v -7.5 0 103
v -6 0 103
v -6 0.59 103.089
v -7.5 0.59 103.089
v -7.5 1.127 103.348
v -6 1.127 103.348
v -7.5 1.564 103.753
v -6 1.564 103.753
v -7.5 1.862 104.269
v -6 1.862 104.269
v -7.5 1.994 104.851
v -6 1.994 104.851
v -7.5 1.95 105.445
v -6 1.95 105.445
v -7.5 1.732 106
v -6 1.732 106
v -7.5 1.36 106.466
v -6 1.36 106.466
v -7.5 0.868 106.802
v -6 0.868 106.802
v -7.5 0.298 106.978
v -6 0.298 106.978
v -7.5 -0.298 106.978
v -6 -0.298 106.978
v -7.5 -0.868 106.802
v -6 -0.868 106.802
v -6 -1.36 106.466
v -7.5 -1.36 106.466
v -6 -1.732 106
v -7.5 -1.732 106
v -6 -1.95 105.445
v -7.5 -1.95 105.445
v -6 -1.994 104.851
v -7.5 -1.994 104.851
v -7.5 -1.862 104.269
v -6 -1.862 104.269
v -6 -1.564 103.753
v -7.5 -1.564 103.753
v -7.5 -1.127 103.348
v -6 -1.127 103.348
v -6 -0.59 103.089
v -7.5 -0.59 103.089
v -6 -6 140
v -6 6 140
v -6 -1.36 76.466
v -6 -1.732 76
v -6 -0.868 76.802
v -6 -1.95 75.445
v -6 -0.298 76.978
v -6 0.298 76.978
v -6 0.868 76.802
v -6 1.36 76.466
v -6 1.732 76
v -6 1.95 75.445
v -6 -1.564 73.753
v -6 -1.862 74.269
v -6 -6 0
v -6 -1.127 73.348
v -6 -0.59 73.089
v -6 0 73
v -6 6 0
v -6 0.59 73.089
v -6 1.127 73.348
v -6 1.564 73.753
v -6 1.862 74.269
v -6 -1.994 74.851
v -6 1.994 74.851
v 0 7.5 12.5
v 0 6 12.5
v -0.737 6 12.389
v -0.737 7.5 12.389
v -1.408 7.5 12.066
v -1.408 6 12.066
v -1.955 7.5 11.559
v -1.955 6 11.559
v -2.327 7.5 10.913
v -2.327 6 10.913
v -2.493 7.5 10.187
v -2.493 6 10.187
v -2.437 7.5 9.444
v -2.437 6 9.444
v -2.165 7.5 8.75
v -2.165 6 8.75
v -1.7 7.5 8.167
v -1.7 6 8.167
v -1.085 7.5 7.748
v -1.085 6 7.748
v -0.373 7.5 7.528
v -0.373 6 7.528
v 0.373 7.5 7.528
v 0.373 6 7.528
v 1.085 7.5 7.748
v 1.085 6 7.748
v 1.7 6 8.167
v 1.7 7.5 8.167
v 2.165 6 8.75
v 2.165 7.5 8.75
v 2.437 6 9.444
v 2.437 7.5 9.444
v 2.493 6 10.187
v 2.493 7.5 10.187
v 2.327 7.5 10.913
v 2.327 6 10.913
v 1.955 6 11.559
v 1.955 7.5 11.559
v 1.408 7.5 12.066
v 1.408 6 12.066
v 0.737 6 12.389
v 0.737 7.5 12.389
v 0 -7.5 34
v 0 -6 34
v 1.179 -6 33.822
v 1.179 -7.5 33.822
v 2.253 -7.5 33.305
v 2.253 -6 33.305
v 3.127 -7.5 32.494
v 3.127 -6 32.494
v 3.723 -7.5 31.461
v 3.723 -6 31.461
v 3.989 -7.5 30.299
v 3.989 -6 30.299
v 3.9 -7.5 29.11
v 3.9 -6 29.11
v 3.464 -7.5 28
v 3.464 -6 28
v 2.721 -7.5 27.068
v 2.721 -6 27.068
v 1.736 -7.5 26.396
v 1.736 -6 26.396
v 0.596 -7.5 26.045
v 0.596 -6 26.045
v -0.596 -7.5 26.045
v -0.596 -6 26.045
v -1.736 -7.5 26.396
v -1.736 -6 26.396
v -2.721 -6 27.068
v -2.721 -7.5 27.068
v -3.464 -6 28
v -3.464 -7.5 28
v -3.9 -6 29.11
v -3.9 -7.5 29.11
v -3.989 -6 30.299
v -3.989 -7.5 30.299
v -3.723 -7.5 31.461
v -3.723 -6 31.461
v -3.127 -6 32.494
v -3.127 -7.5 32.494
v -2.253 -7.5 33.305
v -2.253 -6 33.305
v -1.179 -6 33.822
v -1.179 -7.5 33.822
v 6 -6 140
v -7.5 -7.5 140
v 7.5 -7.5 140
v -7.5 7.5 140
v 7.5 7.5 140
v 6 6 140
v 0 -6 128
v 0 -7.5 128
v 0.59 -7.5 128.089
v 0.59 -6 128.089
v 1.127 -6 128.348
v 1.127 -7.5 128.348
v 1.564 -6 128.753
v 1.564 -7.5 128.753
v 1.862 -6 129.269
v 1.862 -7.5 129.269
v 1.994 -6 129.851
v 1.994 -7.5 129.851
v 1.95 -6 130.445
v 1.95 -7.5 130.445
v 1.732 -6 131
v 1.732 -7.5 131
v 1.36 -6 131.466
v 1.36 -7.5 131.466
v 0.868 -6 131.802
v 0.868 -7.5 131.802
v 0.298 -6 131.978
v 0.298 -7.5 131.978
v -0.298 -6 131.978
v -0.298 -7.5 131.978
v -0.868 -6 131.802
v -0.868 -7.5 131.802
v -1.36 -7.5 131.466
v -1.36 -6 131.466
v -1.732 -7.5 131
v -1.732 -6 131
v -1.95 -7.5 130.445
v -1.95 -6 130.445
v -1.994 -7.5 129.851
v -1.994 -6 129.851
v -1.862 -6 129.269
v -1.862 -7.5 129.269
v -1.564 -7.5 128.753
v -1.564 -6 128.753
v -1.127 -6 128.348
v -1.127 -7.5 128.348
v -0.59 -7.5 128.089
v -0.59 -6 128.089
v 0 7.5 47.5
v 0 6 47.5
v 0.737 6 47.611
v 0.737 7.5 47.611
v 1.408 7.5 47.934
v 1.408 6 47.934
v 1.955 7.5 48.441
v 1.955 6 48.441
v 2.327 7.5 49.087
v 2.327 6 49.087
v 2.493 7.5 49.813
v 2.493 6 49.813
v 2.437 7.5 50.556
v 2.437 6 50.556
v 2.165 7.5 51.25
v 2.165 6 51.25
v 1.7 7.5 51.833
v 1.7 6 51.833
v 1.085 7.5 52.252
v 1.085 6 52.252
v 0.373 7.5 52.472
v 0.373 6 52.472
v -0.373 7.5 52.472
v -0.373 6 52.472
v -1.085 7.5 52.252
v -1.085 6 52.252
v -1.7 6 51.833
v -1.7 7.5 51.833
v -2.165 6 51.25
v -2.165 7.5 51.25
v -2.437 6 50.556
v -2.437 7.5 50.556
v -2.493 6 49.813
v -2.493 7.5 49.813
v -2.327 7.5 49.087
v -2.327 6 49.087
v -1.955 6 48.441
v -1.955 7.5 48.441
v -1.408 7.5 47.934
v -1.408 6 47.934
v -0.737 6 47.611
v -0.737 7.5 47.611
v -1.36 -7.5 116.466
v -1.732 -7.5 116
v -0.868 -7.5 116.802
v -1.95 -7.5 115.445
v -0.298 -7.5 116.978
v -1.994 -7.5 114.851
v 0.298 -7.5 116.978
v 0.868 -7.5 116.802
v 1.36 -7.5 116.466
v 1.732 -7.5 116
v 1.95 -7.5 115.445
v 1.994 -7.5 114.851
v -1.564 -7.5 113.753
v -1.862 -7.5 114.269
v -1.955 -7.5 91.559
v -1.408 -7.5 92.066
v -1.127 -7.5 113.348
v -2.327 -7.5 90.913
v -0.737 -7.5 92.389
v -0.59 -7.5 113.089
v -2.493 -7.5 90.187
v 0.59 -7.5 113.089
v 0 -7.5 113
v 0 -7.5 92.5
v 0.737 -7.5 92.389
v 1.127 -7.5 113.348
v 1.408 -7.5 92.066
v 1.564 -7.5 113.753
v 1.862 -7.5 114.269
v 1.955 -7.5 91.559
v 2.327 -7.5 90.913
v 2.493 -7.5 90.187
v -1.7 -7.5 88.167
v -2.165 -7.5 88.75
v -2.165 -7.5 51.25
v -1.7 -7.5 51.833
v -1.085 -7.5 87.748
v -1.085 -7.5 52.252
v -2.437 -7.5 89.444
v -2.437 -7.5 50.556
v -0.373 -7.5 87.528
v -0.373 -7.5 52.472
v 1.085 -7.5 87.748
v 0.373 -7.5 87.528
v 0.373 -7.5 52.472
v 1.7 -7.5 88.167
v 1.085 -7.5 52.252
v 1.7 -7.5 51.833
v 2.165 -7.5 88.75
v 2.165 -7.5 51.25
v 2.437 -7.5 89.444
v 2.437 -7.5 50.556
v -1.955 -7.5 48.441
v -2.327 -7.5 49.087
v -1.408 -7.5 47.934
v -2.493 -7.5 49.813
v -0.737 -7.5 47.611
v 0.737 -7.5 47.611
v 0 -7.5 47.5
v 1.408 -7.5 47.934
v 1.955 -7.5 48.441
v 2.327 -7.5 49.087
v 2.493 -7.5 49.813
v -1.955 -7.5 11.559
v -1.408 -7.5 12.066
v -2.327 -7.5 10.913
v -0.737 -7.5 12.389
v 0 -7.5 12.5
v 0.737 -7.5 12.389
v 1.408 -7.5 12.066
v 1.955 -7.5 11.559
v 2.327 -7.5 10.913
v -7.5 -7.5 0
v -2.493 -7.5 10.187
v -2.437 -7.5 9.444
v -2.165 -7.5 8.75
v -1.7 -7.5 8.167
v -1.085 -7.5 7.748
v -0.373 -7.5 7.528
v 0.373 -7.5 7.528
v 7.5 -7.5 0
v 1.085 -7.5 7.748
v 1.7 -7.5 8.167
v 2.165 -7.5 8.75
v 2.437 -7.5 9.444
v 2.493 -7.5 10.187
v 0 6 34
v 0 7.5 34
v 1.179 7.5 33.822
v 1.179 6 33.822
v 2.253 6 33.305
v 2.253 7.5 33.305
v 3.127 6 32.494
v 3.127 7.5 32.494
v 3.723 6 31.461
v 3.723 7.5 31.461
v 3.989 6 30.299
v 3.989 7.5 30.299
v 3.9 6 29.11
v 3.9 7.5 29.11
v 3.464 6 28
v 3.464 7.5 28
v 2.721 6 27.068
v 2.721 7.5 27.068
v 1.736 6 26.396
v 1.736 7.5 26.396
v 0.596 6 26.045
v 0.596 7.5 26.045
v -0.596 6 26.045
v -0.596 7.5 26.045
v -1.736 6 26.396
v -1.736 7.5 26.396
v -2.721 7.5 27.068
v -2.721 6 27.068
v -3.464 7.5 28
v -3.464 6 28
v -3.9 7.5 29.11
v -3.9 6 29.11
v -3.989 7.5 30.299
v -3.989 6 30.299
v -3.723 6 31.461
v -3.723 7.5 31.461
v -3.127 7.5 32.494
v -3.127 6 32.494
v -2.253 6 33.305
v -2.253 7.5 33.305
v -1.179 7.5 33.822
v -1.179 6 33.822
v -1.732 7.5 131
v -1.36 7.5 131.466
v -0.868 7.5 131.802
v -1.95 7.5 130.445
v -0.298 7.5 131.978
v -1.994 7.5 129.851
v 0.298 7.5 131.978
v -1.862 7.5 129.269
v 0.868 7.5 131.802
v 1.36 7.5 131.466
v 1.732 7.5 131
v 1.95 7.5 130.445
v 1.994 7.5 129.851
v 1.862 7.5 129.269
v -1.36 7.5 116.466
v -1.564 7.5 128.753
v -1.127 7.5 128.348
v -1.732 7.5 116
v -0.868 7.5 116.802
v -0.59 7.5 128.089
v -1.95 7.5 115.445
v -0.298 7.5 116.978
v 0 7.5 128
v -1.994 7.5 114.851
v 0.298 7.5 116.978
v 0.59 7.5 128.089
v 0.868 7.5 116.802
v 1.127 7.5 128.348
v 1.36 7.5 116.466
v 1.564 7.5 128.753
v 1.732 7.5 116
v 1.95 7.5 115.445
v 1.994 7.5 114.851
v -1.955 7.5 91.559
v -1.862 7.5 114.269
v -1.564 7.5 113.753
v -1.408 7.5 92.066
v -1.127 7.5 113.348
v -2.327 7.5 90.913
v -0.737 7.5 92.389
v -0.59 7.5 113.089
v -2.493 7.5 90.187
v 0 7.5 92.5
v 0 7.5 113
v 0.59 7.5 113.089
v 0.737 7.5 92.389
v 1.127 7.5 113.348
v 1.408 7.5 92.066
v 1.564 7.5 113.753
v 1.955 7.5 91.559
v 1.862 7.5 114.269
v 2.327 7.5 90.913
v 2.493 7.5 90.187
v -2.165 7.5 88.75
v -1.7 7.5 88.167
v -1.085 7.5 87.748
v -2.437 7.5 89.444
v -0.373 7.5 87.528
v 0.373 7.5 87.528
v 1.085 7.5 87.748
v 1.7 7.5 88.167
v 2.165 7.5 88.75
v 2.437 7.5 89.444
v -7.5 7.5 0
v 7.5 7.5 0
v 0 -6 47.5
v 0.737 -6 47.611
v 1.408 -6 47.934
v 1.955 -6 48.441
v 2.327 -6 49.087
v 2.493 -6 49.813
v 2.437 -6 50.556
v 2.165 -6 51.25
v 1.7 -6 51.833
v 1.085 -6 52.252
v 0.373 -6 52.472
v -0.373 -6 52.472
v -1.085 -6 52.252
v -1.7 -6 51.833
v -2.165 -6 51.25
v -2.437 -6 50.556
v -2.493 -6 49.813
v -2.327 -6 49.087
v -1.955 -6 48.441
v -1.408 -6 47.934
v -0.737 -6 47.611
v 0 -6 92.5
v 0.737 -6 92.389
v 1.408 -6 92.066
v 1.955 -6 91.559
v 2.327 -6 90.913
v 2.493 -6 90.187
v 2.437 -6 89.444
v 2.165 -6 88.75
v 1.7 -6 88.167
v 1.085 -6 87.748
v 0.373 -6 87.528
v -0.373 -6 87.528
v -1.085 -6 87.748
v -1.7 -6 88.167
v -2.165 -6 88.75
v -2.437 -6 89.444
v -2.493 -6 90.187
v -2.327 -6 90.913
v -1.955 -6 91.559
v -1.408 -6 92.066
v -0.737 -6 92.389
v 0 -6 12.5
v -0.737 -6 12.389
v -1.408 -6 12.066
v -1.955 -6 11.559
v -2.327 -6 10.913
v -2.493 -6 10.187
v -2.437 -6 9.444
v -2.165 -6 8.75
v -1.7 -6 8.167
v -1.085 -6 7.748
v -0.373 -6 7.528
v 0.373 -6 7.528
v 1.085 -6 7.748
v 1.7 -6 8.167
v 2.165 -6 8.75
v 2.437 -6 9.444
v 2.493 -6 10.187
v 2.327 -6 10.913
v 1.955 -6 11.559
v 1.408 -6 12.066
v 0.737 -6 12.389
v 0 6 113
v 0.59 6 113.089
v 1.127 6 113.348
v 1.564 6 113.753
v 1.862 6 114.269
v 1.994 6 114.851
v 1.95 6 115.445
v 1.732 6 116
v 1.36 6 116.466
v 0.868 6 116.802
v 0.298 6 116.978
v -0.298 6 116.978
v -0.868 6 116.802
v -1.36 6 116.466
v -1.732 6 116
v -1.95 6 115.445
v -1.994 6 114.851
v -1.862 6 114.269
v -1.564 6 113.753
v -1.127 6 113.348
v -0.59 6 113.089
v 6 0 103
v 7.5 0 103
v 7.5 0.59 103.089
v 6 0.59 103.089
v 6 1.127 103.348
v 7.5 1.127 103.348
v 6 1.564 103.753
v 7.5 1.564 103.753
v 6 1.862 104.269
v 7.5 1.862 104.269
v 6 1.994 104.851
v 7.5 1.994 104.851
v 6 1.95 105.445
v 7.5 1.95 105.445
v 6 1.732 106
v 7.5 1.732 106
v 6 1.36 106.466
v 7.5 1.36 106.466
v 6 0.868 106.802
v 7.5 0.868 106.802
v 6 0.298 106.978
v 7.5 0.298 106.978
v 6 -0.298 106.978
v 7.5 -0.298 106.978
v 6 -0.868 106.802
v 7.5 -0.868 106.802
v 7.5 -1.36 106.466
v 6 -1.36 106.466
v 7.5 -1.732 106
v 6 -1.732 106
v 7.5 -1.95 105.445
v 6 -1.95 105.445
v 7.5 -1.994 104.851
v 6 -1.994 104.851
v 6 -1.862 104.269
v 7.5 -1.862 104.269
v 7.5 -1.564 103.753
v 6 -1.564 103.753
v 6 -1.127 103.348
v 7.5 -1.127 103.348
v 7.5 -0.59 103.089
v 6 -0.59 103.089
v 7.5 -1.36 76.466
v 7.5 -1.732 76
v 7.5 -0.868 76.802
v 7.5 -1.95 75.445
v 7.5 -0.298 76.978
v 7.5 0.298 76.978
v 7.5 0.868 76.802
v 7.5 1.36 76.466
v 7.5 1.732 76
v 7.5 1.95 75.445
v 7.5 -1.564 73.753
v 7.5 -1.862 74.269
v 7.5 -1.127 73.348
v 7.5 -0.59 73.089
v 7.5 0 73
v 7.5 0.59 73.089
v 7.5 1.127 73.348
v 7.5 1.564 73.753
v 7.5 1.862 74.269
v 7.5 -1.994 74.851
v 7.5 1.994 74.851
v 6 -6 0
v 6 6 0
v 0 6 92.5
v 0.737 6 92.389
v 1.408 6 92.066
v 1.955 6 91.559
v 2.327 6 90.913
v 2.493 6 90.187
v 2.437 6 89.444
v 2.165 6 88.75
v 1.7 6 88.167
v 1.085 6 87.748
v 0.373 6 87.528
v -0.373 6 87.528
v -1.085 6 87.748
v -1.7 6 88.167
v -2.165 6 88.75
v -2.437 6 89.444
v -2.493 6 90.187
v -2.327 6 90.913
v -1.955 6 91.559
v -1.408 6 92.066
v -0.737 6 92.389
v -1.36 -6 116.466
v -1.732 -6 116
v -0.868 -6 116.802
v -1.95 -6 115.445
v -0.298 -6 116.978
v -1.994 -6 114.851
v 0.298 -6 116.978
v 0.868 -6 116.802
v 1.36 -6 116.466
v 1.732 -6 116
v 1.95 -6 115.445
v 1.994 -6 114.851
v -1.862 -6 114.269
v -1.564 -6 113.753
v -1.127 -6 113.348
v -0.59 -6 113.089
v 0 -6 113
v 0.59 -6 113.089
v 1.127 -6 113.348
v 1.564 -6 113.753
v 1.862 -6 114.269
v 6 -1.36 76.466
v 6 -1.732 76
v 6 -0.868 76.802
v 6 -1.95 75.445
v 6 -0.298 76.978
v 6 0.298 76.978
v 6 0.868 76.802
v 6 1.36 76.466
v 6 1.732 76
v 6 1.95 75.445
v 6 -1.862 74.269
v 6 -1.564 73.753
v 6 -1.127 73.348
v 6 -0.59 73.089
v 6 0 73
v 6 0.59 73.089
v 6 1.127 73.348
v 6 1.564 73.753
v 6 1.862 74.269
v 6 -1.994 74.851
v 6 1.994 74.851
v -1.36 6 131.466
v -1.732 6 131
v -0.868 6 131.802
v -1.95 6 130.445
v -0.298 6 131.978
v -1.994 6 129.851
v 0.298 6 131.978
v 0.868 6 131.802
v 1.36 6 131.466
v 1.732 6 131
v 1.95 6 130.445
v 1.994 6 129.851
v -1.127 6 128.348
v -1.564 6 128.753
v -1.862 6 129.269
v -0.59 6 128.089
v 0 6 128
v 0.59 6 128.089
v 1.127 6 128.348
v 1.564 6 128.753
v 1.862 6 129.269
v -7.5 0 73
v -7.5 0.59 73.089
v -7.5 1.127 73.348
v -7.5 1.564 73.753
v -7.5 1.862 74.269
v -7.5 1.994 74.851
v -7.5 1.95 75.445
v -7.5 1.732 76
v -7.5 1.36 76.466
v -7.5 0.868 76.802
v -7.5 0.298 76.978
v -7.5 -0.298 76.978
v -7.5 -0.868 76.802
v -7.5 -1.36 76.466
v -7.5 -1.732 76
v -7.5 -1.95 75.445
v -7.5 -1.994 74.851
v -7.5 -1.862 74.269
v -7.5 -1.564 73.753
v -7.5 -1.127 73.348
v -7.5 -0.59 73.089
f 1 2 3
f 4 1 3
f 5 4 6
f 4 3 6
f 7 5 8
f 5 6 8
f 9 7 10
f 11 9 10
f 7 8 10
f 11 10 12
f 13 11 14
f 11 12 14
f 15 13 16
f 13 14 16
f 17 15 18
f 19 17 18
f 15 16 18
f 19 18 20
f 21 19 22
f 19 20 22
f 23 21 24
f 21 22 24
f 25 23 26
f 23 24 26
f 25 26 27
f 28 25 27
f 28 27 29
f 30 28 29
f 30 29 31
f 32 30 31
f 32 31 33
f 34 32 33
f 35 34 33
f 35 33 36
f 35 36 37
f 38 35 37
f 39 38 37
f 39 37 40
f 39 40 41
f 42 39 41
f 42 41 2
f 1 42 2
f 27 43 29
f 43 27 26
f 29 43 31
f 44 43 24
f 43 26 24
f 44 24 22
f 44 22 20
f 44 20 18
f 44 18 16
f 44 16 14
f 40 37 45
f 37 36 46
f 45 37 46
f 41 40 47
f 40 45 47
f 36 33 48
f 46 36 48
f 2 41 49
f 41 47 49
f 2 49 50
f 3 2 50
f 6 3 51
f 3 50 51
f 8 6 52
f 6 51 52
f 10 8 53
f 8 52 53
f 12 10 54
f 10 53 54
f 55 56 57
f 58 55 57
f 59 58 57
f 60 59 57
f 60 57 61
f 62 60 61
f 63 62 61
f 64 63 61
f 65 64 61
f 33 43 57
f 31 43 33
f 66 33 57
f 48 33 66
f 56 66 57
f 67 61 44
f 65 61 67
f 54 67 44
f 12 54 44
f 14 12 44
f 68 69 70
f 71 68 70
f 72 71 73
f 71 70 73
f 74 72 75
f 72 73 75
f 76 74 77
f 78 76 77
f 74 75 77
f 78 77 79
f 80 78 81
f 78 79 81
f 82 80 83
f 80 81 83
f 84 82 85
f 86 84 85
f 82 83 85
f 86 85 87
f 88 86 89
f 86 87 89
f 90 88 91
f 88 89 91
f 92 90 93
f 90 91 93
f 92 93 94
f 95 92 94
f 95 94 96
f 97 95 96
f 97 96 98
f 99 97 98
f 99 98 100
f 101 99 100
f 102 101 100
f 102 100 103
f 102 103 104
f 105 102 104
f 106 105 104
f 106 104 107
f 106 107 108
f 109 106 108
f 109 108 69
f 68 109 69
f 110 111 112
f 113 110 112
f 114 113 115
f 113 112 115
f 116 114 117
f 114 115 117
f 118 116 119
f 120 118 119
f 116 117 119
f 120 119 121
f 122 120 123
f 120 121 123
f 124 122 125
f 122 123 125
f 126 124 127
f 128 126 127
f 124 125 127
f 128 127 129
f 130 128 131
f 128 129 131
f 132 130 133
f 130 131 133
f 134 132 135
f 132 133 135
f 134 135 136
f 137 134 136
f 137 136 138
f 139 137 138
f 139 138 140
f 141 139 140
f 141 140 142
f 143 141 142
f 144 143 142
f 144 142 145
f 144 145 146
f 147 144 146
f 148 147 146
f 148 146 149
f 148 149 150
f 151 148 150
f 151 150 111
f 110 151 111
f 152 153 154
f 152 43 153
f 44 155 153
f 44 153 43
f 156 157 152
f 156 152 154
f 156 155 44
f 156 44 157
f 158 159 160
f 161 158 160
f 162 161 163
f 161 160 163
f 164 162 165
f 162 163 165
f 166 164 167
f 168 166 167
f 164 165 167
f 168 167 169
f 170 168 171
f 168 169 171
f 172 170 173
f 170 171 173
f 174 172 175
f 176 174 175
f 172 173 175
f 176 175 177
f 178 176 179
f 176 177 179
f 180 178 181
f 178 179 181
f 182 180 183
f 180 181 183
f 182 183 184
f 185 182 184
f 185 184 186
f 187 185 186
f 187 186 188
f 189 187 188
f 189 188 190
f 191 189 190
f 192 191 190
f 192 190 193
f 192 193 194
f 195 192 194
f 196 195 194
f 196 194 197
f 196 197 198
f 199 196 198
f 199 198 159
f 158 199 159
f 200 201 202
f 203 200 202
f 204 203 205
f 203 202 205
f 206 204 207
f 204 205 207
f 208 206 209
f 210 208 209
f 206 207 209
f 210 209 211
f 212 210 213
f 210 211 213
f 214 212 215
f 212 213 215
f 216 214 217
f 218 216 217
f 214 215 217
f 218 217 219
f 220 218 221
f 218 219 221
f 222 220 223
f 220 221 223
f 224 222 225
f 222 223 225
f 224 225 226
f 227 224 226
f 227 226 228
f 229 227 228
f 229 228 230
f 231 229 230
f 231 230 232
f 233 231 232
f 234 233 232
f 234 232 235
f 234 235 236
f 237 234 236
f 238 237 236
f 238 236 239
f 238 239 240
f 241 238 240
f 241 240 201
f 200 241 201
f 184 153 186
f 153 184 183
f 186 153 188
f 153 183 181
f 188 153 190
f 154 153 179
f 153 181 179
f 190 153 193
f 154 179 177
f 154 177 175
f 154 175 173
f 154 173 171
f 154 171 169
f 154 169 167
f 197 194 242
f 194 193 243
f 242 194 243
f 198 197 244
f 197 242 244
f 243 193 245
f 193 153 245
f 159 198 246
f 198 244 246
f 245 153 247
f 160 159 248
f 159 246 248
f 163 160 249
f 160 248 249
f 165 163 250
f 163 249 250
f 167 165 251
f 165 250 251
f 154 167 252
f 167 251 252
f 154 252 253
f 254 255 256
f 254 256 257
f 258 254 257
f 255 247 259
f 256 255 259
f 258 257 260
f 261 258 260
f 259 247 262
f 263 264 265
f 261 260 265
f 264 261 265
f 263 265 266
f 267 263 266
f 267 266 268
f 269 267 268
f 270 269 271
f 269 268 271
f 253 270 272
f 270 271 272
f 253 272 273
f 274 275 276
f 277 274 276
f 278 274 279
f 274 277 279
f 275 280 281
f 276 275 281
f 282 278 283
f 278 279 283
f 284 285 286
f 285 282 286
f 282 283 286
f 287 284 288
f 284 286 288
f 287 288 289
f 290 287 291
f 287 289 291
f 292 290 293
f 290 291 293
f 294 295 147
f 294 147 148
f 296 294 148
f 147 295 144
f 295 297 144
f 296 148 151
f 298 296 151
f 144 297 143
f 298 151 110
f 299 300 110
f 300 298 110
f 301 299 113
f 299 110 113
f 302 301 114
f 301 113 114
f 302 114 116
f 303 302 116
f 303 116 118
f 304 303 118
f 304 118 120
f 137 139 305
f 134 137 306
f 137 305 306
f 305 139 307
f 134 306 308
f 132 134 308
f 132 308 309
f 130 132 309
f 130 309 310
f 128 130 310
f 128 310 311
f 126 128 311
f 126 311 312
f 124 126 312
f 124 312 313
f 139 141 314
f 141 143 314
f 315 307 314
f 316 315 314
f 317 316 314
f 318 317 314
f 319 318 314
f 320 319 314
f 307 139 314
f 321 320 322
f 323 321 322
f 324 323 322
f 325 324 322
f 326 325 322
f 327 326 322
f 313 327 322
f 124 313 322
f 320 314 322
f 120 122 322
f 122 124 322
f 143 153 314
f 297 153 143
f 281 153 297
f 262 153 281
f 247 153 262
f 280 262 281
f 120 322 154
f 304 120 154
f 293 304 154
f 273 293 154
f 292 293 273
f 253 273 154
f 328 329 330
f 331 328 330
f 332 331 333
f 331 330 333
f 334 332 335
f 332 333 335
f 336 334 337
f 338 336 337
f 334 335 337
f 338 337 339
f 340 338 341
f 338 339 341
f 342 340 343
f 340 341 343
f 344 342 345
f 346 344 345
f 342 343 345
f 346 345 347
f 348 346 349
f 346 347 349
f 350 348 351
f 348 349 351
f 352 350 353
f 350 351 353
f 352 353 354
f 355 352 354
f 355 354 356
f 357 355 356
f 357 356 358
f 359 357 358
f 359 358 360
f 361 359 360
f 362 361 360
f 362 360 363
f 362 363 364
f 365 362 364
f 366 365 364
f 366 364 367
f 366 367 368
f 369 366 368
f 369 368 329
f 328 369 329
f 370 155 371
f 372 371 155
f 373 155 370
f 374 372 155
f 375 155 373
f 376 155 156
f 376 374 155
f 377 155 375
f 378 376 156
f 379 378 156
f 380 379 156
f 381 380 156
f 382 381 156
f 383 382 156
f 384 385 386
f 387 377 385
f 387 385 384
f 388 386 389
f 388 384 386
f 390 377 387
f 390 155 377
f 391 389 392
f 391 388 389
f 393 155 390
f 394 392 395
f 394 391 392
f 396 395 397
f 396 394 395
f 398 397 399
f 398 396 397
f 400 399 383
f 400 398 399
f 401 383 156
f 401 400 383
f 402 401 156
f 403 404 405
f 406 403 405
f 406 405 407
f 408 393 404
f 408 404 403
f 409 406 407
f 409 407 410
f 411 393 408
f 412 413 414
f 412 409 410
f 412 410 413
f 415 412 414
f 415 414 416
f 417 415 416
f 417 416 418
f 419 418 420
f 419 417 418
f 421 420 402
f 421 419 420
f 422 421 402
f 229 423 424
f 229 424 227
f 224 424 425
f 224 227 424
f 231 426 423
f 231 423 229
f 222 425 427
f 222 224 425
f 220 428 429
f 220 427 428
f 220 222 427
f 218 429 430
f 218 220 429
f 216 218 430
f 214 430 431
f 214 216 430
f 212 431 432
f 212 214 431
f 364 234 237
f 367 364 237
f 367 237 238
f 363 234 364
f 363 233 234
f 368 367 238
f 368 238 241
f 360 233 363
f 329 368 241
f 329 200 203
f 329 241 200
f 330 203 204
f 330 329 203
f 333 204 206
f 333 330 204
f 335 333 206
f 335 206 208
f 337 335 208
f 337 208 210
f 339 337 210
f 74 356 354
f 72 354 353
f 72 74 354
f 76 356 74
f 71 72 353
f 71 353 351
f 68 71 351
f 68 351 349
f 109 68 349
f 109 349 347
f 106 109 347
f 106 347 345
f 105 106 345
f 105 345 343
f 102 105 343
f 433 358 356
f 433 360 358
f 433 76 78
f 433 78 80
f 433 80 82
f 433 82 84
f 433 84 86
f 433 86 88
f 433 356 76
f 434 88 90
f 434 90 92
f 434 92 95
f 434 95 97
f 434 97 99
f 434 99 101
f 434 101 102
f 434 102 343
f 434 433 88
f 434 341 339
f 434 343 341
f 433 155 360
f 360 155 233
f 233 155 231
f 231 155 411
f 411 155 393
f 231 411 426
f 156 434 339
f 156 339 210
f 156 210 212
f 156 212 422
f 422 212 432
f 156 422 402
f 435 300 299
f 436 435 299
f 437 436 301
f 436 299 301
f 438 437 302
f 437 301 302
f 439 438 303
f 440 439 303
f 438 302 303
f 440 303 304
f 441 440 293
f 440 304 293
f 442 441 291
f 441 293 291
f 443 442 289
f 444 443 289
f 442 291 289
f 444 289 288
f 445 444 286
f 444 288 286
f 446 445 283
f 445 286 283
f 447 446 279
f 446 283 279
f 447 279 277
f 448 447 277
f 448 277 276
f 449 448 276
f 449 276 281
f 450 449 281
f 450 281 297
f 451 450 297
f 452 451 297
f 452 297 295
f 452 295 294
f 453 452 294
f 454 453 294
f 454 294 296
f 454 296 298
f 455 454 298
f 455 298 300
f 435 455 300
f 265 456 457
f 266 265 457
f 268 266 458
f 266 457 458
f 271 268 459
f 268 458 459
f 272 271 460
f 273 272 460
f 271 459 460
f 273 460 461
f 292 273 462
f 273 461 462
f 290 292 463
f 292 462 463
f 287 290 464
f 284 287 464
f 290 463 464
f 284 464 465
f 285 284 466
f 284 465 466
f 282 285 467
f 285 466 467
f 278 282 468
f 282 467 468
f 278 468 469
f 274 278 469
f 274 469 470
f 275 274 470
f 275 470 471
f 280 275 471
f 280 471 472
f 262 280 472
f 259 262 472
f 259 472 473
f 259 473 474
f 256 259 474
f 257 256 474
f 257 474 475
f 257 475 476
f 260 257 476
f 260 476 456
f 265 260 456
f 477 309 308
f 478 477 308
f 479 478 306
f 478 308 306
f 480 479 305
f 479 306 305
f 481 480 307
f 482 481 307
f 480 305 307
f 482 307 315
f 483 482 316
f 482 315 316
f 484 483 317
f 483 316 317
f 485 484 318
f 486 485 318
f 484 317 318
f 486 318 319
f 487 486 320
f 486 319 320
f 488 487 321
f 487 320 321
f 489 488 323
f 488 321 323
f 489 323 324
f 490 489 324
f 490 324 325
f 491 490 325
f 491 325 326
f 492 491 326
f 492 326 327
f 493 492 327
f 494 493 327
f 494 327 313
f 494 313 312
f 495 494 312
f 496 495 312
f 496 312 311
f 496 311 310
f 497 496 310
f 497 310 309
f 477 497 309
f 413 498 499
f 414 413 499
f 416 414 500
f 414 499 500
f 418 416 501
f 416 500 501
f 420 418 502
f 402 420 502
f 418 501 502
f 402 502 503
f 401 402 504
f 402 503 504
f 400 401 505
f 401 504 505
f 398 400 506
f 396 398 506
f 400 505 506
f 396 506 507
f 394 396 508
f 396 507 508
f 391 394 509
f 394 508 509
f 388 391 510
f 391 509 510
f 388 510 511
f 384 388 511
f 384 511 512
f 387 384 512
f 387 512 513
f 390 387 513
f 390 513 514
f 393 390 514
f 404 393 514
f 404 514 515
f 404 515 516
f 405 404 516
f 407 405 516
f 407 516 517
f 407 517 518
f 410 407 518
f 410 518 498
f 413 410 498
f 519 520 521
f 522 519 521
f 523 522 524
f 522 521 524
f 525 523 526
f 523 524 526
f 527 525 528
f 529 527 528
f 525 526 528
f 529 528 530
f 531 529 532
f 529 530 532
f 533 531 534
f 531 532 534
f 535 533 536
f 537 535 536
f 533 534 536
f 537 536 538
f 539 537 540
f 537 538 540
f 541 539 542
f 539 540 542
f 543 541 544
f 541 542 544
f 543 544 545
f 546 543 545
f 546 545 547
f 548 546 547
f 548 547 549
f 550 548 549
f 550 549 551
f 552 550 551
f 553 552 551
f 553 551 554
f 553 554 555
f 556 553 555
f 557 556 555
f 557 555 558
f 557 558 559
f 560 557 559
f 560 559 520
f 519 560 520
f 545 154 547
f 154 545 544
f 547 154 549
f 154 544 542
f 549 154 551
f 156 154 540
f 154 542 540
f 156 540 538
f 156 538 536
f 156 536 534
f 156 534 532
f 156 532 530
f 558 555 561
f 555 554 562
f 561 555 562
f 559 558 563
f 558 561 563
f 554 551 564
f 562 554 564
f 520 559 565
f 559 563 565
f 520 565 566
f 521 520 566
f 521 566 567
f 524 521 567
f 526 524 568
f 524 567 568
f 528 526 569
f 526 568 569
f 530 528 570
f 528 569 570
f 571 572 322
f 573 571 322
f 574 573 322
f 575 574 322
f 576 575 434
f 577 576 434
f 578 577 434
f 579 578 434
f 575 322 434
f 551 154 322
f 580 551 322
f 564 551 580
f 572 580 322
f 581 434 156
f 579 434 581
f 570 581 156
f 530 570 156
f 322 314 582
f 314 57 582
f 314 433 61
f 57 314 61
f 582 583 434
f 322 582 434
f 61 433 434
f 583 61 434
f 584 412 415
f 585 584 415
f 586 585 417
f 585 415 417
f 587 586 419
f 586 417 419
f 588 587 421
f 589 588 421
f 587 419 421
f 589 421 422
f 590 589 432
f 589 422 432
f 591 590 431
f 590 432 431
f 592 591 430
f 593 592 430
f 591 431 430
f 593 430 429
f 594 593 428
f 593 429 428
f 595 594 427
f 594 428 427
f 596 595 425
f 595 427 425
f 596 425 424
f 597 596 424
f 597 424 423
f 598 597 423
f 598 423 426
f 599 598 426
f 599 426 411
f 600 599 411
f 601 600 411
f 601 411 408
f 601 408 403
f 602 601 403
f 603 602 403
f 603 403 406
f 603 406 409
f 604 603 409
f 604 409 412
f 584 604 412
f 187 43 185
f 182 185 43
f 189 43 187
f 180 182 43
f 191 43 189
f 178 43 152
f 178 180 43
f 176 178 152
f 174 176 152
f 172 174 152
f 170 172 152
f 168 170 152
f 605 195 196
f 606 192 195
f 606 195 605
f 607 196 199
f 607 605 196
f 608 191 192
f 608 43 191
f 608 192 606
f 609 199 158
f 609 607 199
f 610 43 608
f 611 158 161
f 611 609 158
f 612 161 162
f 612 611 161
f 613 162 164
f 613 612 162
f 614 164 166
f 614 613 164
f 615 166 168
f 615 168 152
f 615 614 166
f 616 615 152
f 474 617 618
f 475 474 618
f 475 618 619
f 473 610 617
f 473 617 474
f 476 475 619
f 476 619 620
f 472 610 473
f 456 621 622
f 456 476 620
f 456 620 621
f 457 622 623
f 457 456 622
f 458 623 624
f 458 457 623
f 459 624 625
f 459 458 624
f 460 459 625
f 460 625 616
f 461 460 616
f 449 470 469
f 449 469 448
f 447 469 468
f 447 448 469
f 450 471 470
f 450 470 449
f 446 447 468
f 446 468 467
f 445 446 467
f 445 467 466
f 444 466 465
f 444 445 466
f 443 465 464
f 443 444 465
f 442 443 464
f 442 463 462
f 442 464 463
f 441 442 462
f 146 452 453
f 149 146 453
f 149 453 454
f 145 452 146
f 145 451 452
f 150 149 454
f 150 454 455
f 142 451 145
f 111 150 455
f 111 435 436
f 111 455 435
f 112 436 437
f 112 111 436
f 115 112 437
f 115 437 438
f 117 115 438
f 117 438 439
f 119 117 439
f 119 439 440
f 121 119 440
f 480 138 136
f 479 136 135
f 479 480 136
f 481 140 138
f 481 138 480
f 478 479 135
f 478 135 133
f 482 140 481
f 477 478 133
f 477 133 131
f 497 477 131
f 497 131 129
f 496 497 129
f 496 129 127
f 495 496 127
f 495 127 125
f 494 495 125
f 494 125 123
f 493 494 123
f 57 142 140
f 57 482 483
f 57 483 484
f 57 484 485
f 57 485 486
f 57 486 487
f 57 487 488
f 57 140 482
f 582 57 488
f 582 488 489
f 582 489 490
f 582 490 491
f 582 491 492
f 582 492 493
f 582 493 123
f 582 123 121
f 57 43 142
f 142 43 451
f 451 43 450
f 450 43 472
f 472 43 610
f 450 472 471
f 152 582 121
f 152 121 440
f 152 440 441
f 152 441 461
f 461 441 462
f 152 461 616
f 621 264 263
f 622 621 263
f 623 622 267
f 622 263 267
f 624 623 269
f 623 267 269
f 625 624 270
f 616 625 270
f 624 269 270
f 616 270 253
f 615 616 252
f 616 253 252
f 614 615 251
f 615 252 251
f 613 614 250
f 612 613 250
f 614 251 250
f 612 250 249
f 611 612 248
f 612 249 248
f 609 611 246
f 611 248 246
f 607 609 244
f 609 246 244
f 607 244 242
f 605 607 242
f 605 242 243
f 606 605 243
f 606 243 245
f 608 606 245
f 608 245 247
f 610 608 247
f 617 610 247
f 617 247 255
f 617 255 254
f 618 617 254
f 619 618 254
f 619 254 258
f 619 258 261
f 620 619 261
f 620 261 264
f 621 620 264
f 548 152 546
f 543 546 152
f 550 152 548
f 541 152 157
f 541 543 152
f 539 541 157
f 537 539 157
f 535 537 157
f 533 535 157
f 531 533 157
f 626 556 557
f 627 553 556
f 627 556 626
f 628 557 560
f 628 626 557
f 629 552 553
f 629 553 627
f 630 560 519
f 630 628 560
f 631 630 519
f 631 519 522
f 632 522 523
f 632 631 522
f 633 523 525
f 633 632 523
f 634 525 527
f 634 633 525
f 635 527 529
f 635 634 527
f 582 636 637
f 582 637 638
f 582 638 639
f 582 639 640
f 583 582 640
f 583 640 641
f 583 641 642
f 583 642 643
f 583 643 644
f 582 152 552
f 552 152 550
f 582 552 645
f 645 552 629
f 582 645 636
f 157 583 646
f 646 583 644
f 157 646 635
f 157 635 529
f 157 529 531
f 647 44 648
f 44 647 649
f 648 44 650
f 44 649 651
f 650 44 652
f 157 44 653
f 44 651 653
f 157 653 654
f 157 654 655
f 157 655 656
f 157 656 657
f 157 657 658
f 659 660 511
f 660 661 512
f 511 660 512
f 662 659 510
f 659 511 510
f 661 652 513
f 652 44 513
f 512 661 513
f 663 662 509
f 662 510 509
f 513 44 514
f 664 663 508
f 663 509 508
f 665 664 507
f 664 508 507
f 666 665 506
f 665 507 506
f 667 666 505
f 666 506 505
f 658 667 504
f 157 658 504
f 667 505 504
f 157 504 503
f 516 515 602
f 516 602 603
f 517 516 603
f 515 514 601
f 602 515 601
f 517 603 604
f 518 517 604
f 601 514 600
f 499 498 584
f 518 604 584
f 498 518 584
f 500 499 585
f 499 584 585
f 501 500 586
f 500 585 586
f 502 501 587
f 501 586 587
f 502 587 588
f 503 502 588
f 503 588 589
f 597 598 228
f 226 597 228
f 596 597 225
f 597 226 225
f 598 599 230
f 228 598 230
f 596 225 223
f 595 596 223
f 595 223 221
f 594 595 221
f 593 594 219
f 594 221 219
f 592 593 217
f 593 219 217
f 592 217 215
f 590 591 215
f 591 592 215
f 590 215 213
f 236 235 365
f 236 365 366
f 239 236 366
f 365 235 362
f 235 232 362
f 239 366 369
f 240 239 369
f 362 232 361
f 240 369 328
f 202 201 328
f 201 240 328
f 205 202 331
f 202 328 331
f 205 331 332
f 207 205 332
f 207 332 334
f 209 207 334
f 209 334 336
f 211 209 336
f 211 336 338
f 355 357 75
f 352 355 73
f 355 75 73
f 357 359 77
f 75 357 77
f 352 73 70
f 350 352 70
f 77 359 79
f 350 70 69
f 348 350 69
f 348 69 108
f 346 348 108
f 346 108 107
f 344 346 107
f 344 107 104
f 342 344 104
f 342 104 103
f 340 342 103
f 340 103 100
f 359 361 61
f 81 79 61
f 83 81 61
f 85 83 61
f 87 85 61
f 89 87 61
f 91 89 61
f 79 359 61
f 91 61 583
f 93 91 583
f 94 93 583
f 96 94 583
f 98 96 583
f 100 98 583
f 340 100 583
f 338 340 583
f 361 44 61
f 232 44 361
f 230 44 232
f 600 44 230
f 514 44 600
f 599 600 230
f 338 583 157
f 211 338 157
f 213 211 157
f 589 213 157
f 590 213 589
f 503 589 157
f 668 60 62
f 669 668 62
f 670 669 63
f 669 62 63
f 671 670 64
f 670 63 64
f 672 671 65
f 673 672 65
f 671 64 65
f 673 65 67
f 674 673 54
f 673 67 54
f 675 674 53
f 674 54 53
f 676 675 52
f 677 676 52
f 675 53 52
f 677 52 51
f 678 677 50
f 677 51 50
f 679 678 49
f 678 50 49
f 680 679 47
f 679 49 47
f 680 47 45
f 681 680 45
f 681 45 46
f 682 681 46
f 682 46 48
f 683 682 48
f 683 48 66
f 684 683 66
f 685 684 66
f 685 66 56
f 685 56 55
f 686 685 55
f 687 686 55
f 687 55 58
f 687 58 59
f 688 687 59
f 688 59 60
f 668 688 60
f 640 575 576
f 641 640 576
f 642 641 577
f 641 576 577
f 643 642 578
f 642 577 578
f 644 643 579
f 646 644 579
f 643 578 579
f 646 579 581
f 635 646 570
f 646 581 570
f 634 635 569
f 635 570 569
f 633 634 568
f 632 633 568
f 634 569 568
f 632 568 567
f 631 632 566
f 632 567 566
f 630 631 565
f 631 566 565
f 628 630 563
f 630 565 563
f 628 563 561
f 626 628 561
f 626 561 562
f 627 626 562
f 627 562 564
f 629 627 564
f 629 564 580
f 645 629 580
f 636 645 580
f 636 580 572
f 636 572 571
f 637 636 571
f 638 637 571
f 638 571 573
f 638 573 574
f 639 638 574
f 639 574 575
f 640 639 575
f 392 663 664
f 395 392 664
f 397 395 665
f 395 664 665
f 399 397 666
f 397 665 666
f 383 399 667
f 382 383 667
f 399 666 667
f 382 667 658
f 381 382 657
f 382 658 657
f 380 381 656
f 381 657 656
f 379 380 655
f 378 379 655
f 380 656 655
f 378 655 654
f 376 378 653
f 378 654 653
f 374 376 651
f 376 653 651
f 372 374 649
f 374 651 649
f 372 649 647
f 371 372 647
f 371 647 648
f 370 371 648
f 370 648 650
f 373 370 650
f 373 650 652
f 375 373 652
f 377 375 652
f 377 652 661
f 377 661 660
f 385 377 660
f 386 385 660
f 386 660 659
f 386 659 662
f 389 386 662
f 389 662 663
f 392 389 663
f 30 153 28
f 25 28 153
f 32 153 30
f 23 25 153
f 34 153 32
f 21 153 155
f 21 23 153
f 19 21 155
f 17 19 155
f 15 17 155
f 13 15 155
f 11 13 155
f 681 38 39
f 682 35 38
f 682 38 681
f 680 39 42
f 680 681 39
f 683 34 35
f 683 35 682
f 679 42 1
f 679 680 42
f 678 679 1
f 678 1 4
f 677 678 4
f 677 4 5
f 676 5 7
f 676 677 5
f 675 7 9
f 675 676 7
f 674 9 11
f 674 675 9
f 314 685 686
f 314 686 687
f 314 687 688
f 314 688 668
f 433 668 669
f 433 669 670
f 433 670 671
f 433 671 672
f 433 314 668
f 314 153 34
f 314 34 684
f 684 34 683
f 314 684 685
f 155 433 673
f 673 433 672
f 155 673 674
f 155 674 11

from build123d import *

# Parameters (mm, degrees)
SKETCH_1_W          = 15
SKETCH_1_H          = 15
SKETCH_1_W_2        = 12
SKETCH_1_H_2        = 12
EXTRUDE_1_DEPTH     = 140
SKETCH_3_R          = 4
CUT_EXTRUDE_1_DEPTH = 22
SKETCH_4_R          = 2
CUT_EXTRUDE_2_DEPTH = 75
SKETCH_5_R          = 2
CUT_EXTRUDE_3_DEPTH = 24
SKETCH_6_R          = 2.5
CUT_EXTRUDE_4_DEPTH = 142.000886522
SKETCH_7_R          = 2.5
CUT_EXTRUDE_5_DEPTH = 142.000886522


with BuildPart() as part:
    # 草图1 → 凸台-拉伸1 (new body)
    with BuildSketch(Plane.XY):
        Rectangle(SKETCH_1_W, SKETCH_1_H)
        Rectangle(SKETCH_1_W_2, SKETCH_1_H_2, mode=Mode.SUBTRACT)
    extrude(amount=EXTRUDE_1_DEPTH)

    # 草图3 → 切除-拉伸1 (cut)
    with BuildSketch(Plane(origin=(0, 7.5, 0), x_dir=(1, 0, 0), z_dir=(0, 1, 0))):
        with Locations(Location((0, -30, 0), (0, 0, 270))):
            Circle(SKETCH_3_R)
    extrude(amount=-CUT_EXTRUDE_1_DEPTH, mode=Mode.SUBTRACT)

    # 草图4 → 切除-拉伸2 (cut)
    with BuildSketch(Plane.XZ.offset(7.5)):
        with Locations(Location((0, 130, 0), (0, 0, 270))):
            Circle(SKETCH_4_R)
        with Locations(Location((0, 115, 0), (0, 0, 270))):
            Circle(SKETCH_4_R)
    extrude(amount=-CUT_EXTRUDE_2_DEPTH, mode=Mode.SUBTRACT)

    # 草图5 → 切除-拉伸3 (cut)
    with BuildSketch(Plane(origin=(7.5, 0, 0), x_dir=(0, 0, -1), z_dir=(1, 0, 0))):
        with Locations((-105, 0)):
            Circle(SKETCH_5_R)
        with Locations((-75, 0)):
            Circle(SKETCH_5_R)
    extrude(amount=-CUT_EXTRUDE_3_DEPTH, mode=Mode.SUBTRACT)

    # 草图6 → 切除-拉伸4 (cut, through all)
    with BuildSketch(Plane.XZ.offset(7.5)):
        with Locations(Location((0, 50, 0), (0, 0, 270))):
            Circle(SKETCH_6_R)
        with Locations(Location((0, 10, 0), (0, 0, 90))):
            Circle(SKETCH_6_R)
    extrude(amount=-CUT_EXTRUDE_4_DEPTH, mode=Mode.SUBTRACT)

    # 草图7 → 切除-拉伸5 (cut, through all)
    with BuildSketch(Plane(origin=(0, 7.5, 0), x_dir=(1, 0, 0), z_dir=(0, 1, 0))):
        with Locations(Location((0, -90, 0), (0, 0, 270))):
            Circle(SKETCH_7_R)
    extrude(amount=-CUT_EXTRUDE_5_DEPTH, mode=Mode.SUBTRACT)


solid = part.part
